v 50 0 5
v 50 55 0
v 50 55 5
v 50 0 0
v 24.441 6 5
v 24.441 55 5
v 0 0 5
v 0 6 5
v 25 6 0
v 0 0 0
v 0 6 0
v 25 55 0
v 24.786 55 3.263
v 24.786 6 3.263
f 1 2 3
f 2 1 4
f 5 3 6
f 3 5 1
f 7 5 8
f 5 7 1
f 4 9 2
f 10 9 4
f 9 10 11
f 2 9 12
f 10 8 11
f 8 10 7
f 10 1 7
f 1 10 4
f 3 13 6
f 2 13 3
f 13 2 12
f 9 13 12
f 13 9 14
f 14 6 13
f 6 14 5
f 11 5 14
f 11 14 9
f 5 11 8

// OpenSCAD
// L-shaped mounting bracket for a NEMA 17 stepper motor (syringe pump, bench top). NOVEL general part.
//

base_d  = 50;
base_t  = 5;
arm_l   = 50;
arm_t   = 5;
motor_h = 50;
screw  = 3.4;

$fn = 48;

gusset_t = 5;

difference() {
    union() {
        cube([base_d, base_t, base_t]);              // base plate (square, not rectangular - the user's X span -25..25 is 50 mm)
        cube([base_d, base_t, base_t]);
        translate([0, base_t, 0]) cube([base_d, arm_l, arm_t]);           // vertical motor plate
        for (x = [-25, 25])
            translate([x, base_t, 0])
                linear_extrude(gusset_t)
                    translate([0, base_t, 0]) cube([20, 20, 1]);           // gussets: right triangle in the YZ plane, legs 20 x 20, right angle at (y=5, z=5)
    }
    translate([0, base_t + 1, 0]) rotate([-90, 0, 0]) cylinder(h = arm_l + 2, d = motor_h);                 // motor boss hole (along Y)
    for (z = [28 - 15.5, 28 + 15.5])
        translate([0, base_t + 1, z]) rotate([-90, 0, 0]) cylinder(h = base_d + 2, d = screw);              // screw holes
}
